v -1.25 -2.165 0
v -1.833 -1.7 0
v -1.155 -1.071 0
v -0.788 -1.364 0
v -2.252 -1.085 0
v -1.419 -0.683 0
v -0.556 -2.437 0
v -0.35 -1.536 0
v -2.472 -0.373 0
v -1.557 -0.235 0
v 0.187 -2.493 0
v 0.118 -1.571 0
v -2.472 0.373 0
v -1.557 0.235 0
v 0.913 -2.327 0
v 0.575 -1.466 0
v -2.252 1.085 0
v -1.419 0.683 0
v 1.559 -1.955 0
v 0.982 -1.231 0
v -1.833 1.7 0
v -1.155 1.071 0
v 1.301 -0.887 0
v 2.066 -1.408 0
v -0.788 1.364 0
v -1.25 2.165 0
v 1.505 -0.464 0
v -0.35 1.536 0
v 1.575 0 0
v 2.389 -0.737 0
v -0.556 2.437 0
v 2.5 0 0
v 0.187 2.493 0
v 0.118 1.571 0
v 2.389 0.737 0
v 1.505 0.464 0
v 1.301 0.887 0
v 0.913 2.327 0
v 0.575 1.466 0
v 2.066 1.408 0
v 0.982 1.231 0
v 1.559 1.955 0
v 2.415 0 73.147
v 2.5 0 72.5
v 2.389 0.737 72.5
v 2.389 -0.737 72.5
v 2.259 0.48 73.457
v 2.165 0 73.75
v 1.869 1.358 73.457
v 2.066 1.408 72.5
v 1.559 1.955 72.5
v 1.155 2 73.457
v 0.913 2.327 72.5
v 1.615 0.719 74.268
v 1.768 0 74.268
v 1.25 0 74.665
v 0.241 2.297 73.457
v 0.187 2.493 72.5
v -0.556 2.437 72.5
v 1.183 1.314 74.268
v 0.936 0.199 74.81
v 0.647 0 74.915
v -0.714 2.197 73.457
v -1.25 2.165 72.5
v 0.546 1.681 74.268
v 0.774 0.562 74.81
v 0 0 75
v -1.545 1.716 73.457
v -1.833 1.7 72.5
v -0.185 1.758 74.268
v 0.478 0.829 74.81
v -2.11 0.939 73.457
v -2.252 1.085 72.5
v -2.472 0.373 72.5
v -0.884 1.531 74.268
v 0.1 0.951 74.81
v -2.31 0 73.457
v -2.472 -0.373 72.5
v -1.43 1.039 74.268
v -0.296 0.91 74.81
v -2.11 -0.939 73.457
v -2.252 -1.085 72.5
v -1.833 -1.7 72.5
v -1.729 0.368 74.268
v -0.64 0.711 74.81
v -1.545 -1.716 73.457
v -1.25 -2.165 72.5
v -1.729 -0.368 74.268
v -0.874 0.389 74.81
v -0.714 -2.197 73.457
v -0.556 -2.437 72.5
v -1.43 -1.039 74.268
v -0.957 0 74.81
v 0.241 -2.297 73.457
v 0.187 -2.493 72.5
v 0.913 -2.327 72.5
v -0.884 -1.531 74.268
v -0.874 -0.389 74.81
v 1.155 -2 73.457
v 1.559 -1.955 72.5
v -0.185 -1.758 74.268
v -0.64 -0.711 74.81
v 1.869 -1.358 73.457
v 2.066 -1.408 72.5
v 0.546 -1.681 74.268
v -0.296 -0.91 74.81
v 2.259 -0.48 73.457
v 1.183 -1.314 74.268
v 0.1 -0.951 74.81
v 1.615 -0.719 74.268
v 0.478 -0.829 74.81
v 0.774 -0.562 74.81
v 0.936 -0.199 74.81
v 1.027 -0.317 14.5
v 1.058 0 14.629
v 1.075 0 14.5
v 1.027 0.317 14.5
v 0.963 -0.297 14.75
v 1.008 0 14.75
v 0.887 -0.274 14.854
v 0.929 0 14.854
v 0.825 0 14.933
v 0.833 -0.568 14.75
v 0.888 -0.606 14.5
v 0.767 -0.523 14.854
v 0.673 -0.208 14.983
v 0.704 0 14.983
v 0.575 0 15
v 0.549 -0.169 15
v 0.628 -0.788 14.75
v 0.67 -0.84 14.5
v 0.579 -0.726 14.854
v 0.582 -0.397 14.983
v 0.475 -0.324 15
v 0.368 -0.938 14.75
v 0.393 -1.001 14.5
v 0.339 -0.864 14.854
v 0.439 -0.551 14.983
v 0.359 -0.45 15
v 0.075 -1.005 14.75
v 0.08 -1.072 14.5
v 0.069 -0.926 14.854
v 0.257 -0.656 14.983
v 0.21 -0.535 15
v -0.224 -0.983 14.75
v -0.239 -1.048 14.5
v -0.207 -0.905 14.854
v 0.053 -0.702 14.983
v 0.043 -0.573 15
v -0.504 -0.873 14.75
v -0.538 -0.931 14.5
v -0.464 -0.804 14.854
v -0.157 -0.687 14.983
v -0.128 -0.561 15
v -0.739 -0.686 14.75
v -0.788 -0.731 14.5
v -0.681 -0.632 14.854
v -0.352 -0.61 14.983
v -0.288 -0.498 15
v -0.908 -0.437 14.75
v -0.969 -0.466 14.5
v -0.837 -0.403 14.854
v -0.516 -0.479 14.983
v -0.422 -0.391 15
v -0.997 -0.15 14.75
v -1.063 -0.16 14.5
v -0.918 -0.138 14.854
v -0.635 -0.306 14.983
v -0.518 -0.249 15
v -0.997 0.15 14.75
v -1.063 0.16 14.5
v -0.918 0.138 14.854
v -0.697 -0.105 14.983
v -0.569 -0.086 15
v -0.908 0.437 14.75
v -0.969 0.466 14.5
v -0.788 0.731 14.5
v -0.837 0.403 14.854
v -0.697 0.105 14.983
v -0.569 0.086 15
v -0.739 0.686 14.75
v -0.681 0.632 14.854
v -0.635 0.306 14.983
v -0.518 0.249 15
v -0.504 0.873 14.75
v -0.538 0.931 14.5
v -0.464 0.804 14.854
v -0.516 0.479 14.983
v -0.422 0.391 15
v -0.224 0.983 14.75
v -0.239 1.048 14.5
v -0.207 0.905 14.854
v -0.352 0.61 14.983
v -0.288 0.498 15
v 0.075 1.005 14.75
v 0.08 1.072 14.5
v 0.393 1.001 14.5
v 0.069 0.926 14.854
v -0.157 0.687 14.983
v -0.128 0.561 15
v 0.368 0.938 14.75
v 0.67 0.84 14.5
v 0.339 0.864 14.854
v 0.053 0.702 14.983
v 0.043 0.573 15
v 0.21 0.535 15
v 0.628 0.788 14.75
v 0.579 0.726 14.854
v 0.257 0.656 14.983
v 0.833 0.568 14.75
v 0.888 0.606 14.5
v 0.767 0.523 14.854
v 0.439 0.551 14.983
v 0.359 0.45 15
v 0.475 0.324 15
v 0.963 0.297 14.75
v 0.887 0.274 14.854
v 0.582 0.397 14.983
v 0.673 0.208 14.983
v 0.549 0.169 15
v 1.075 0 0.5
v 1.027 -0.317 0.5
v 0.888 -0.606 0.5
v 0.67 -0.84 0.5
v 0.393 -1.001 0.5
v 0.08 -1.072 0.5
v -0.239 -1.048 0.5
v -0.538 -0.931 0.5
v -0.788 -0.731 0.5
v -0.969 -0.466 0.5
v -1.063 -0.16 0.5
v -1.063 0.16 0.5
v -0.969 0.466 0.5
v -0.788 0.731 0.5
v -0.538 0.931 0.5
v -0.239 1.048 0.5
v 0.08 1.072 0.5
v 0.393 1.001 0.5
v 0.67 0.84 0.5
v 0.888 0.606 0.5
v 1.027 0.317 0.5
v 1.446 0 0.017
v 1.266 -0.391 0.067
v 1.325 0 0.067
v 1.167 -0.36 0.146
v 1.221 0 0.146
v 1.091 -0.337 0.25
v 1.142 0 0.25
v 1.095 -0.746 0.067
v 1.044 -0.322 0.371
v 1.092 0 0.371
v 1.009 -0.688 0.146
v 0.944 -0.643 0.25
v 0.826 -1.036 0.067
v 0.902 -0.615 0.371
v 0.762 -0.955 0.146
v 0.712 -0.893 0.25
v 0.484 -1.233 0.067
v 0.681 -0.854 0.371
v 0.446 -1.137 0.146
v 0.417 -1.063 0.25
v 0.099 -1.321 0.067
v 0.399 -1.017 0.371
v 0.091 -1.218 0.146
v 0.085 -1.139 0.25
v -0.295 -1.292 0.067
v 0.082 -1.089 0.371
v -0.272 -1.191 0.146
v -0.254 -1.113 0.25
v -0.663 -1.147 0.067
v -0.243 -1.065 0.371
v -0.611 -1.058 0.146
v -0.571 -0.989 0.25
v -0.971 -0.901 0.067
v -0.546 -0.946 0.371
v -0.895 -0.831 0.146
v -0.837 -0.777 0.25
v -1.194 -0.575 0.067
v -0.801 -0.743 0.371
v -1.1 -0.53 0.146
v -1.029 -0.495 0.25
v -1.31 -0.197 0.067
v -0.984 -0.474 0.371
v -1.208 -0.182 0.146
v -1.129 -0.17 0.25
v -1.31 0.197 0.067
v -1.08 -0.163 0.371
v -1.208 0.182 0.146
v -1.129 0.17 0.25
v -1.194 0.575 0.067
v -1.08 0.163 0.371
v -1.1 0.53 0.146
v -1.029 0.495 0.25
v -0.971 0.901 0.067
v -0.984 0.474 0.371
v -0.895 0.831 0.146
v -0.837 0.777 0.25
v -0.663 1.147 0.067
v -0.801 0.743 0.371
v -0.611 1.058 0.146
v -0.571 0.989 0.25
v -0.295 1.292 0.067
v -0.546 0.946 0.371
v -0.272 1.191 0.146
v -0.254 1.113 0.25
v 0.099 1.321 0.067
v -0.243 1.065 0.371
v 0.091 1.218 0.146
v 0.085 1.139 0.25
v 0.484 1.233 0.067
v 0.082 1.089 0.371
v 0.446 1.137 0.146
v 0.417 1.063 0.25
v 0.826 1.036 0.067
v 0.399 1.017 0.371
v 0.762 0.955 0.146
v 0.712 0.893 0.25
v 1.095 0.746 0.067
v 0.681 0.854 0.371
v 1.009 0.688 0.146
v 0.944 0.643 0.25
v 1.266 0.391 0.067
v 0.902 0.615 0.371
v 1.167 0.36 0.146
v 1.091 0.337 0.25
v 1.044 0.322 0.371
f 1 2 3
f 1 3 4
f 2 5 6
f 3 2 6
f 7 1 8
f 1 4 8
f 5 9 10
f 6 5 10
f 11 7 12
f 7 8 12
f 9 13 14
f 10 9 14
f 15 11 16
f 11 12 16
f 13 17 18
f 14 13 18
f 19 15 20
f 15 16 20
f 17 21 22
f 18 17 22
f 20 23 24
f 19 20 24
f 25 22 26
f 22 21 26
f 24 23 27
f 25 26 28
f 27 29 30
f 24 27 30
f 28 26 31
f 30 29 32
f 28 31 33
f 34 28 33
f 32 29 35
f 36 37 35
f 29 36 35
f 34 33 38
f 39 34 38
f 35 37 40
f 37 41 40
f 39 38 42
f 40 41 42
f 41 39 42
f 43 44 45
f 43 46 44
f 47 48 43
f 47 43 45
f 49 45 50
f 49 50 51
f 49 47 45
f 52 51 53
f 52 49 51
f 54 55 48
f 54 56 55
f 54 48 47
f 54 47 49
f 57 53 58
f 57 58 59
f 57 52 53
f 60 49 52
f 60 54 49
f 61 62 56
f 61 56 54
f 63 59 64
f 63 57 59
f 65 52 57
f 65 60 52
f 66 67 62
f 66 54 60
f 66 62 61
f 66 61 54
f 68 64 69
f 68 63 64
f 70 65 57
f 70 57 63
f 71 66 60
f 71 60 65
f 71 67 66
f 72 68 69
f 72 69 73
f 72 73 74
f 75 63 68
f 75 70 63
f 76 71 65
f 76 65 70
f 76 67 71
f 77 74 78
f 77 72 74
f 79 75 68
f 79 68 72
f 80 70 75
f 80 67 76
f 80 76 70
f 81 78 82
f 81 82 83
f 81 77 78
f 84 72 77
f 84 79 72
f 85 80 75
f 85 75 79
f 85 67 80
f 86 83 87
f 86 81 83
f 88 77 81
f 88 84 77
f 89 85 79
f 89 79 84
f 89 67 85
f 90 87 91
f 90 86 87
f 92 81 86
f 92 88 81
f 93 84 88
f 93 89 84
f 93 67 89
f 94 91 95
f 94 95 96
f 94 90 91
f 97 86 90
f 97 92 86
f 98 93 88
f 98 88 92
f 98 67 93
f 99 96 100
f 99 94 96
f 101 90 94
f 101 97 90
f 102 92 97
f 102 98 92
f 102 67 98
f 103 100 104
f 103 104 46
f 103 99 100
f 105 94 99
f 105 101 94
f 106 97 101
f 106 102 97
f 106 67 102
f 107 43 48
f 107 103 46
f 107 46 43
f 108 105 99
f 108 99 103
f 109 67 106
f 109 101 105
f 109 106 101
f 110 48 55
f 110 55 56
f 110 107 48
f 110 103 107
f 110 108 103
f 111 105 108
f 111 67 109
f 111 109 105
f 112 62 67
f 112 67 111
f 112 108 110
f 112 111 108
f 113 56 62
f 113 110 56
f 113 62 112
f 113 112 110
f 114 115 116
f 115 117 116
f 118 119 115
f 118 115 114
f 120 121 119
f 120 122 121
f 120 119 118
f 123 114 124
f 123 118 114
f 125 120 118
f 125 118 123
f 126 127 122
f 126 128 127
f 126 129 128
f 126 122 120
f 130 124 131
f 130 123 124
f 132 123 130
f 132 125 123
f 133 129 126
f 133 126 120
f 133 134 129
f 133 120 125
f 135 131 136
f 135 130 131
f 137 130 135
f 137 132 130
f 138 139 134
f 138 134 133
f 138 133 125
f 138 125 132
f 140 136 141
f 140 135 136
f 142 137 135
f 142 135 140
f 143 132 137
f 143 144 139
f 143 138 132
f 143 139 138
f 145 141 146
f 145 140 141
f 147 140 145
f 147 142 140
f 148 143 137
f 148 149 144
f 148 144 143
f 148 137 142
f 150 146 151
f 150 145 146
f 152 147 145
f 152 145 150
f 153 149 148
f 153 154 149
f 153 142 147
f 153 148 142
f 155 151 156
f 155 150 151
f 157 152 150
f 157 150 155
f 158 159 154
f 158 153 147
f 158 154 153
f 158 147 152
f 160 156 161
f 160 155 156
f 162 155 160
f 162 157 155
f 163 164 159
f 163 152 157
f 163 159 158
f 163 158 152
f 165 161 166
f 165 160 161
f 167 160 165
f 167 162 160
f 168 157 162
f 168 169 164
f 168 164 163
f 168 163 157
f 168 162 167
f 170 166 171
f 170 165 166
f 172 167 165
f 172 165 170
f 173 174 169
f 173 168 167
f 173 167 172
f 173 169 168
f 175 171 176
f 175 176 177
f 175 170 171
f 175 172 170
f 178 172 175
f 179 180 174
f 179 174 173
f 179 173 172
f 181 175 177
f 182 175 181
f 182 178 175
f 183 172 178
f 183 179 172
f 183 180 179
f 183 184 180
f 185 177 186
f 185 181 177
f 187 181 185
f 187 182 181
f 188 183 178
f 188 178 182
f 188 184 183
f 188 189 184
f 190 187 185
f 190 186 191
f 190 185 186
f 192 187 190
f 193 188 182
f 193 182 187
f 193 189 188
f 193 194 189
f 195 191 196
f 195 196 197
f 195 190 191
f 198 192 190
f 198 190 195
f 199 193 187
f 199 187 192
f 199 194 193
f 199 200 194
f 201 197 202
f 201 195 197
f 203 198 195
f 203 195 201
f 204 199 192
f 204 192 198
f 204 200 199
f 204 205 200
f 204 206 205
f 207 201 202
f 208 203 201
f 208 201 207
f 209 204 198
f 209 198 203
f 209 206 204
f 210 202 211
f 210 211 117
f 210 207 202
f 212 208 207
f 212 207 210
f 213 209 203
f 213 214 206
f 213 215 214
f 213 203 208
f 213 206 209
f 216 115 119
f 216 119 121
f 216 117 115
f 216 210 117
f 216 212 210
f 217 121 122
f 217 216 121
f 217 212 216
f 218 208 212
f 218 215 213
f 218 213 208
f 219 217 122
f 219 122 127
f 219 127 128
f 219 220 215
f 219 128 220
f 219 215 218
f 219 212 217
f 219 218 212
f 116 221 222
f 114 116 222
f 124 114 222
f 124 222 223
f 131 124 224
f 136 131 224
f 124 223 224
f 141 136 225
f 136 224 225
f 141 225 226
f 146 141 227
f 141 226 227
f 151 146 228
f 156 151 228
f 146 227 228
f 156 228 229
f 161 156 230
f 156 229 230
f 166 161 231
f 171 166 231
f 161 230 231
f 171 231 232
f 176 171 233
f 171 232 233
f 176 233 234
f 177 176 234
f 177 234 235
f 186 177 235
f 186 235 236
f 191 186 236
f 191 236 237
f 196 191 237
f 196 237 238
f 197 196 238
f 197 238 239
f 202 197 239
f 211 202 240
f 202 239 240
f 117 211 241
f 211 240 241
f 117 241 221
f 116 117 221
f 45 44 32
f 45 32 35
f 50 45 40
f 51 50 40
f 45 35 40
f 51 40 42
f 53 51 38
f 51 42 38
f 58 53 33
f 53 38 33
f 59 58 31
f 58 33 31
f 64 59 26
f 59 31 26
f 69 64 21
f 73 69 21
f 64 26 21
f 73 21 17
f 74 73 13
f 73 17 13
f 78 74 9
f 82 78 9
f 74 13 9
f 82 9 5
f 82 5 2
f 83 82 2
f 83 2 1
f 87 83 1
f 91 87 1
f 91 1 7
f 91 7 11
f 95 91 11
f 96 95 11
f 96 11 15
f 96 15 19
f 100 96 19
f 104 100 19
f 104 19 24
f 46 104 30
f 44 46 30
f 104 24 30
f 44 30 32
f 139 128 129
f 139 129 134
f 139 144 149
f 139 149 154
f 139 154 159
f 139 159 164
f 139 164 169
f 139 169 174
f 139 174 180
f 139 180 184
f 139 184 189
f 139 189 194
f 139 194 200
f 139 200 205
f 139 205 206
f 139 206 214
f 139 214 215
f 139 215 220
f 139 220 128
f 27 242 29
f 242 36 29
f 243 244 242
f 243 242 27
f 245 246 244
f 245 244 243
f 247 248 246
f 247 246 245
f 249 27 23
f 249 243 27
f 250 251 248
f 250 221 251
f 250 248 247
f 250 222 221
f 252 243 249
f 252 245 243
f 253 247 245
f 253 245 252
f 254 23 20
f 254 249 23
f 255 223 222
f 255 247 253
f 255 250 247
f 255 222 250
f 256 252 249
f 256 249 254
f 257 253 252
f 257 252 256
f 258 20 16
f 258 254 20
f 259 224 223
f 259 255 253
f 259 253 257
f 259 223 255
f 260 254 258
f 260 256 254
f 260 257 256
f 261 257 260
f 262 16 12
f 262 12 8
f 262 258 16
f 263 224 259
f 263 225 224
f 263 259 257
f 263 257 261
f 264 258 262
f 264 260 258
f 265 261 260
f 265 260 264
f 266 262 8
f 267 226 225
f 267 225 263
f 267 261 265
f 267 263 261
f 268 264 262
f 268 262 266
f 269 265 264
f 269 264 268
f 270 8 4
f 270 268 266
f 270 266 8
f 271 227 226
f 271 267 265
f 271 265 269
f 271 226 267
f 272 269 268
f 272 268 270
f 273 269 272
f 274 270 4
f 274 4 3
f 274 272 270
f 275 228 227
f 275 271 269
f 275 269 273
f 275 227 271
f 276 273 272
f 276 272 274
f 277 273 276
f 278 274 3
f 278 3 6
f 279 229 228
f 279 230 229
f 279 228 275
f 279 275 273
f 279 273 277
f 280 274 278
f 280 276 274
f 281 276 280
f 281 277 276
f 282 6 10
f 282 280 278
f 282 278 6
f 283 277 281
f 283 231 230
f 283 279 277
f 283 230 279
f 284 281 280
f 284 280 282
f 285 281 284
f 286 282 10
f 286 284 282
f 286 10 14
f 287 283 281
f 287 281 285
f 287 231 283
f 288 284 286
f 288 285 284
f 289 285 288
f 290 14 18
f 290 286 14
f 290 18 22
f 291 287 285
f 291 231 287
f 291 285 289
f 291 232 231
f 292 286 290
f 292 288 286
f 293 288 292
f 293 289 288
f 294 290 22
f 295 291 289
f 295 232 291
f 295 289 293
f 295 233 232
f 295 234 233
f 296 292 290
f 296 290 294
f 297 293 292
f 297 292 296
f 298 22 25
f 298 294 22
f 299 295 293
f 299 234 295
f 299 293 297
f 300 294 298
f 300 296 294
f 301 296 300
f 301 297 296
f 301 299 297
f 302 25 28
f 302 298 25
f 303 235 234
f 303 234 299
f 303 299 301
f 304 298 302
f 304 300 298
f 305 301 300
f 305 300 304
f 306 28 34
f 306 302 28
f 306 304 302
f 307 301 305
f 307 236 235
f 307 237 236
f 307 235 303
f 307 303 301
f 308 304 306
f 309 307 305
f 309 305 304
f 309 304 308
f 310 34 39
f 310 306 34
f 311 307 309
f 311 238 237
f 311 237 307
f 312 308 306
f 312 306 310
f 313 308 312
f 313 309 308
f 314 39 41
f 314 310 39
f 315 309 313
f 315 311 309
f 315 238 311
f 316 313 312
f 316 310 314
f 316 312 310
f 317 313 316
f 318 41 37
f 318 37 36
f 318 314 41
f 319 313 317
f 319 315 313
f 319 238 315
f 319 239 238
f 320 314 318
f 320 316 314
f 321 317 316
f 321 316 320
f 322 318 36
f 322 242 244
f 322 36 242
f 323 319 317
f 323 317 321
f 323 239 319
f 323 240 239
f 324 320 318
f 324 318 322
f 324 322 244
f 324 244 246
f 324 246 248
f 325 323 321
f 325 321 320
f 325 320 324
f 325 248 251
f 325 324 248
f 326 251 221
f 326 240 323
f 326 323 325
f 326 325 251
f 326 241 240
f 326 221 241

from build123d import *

# Parameters (mm, degrees)
F0_R     = 2.5
F1_DEPTH = 75
F2_R     = 2.5
F3_R     = 1.075
F4_DEPTH = 15
F5_R     = 0.5


with BuildPart() as f1:
    # F0 (on Top) → F1 (new body)
    with BuildSketch(Plane.XY):
        Circle(F0_R)
    extrude(amount=F1_DEPTH)

    # F2
    f2_edges = [f1.edges().sort_by_distance(p)[0] for p in [
        (-2.5, 0, 75),
    ]]
    fillet(f2_edges, radius=F2_R)

    # F3 (on face) → F4 (cut)
    with BuildSketch(Plane(origin=(0, 0, 0), x_dir=(1, 0, 0), z_dir=(0, 0, -1))):
        Circle(F3_R)
    extrude(amount=-F4_DEPTH, mode=Mode.SUBTRACT)

    # F5
    f5_edges = [f1.edges().sort_by_distance(p)[0] for p in [
        (-1.075, 0, 0),
        (1.075, 0, 7.5),
        (-1.075, 0, 15),
    ]]
    fillet(f5_edges, radius=F5_R)


solid = f1.part
